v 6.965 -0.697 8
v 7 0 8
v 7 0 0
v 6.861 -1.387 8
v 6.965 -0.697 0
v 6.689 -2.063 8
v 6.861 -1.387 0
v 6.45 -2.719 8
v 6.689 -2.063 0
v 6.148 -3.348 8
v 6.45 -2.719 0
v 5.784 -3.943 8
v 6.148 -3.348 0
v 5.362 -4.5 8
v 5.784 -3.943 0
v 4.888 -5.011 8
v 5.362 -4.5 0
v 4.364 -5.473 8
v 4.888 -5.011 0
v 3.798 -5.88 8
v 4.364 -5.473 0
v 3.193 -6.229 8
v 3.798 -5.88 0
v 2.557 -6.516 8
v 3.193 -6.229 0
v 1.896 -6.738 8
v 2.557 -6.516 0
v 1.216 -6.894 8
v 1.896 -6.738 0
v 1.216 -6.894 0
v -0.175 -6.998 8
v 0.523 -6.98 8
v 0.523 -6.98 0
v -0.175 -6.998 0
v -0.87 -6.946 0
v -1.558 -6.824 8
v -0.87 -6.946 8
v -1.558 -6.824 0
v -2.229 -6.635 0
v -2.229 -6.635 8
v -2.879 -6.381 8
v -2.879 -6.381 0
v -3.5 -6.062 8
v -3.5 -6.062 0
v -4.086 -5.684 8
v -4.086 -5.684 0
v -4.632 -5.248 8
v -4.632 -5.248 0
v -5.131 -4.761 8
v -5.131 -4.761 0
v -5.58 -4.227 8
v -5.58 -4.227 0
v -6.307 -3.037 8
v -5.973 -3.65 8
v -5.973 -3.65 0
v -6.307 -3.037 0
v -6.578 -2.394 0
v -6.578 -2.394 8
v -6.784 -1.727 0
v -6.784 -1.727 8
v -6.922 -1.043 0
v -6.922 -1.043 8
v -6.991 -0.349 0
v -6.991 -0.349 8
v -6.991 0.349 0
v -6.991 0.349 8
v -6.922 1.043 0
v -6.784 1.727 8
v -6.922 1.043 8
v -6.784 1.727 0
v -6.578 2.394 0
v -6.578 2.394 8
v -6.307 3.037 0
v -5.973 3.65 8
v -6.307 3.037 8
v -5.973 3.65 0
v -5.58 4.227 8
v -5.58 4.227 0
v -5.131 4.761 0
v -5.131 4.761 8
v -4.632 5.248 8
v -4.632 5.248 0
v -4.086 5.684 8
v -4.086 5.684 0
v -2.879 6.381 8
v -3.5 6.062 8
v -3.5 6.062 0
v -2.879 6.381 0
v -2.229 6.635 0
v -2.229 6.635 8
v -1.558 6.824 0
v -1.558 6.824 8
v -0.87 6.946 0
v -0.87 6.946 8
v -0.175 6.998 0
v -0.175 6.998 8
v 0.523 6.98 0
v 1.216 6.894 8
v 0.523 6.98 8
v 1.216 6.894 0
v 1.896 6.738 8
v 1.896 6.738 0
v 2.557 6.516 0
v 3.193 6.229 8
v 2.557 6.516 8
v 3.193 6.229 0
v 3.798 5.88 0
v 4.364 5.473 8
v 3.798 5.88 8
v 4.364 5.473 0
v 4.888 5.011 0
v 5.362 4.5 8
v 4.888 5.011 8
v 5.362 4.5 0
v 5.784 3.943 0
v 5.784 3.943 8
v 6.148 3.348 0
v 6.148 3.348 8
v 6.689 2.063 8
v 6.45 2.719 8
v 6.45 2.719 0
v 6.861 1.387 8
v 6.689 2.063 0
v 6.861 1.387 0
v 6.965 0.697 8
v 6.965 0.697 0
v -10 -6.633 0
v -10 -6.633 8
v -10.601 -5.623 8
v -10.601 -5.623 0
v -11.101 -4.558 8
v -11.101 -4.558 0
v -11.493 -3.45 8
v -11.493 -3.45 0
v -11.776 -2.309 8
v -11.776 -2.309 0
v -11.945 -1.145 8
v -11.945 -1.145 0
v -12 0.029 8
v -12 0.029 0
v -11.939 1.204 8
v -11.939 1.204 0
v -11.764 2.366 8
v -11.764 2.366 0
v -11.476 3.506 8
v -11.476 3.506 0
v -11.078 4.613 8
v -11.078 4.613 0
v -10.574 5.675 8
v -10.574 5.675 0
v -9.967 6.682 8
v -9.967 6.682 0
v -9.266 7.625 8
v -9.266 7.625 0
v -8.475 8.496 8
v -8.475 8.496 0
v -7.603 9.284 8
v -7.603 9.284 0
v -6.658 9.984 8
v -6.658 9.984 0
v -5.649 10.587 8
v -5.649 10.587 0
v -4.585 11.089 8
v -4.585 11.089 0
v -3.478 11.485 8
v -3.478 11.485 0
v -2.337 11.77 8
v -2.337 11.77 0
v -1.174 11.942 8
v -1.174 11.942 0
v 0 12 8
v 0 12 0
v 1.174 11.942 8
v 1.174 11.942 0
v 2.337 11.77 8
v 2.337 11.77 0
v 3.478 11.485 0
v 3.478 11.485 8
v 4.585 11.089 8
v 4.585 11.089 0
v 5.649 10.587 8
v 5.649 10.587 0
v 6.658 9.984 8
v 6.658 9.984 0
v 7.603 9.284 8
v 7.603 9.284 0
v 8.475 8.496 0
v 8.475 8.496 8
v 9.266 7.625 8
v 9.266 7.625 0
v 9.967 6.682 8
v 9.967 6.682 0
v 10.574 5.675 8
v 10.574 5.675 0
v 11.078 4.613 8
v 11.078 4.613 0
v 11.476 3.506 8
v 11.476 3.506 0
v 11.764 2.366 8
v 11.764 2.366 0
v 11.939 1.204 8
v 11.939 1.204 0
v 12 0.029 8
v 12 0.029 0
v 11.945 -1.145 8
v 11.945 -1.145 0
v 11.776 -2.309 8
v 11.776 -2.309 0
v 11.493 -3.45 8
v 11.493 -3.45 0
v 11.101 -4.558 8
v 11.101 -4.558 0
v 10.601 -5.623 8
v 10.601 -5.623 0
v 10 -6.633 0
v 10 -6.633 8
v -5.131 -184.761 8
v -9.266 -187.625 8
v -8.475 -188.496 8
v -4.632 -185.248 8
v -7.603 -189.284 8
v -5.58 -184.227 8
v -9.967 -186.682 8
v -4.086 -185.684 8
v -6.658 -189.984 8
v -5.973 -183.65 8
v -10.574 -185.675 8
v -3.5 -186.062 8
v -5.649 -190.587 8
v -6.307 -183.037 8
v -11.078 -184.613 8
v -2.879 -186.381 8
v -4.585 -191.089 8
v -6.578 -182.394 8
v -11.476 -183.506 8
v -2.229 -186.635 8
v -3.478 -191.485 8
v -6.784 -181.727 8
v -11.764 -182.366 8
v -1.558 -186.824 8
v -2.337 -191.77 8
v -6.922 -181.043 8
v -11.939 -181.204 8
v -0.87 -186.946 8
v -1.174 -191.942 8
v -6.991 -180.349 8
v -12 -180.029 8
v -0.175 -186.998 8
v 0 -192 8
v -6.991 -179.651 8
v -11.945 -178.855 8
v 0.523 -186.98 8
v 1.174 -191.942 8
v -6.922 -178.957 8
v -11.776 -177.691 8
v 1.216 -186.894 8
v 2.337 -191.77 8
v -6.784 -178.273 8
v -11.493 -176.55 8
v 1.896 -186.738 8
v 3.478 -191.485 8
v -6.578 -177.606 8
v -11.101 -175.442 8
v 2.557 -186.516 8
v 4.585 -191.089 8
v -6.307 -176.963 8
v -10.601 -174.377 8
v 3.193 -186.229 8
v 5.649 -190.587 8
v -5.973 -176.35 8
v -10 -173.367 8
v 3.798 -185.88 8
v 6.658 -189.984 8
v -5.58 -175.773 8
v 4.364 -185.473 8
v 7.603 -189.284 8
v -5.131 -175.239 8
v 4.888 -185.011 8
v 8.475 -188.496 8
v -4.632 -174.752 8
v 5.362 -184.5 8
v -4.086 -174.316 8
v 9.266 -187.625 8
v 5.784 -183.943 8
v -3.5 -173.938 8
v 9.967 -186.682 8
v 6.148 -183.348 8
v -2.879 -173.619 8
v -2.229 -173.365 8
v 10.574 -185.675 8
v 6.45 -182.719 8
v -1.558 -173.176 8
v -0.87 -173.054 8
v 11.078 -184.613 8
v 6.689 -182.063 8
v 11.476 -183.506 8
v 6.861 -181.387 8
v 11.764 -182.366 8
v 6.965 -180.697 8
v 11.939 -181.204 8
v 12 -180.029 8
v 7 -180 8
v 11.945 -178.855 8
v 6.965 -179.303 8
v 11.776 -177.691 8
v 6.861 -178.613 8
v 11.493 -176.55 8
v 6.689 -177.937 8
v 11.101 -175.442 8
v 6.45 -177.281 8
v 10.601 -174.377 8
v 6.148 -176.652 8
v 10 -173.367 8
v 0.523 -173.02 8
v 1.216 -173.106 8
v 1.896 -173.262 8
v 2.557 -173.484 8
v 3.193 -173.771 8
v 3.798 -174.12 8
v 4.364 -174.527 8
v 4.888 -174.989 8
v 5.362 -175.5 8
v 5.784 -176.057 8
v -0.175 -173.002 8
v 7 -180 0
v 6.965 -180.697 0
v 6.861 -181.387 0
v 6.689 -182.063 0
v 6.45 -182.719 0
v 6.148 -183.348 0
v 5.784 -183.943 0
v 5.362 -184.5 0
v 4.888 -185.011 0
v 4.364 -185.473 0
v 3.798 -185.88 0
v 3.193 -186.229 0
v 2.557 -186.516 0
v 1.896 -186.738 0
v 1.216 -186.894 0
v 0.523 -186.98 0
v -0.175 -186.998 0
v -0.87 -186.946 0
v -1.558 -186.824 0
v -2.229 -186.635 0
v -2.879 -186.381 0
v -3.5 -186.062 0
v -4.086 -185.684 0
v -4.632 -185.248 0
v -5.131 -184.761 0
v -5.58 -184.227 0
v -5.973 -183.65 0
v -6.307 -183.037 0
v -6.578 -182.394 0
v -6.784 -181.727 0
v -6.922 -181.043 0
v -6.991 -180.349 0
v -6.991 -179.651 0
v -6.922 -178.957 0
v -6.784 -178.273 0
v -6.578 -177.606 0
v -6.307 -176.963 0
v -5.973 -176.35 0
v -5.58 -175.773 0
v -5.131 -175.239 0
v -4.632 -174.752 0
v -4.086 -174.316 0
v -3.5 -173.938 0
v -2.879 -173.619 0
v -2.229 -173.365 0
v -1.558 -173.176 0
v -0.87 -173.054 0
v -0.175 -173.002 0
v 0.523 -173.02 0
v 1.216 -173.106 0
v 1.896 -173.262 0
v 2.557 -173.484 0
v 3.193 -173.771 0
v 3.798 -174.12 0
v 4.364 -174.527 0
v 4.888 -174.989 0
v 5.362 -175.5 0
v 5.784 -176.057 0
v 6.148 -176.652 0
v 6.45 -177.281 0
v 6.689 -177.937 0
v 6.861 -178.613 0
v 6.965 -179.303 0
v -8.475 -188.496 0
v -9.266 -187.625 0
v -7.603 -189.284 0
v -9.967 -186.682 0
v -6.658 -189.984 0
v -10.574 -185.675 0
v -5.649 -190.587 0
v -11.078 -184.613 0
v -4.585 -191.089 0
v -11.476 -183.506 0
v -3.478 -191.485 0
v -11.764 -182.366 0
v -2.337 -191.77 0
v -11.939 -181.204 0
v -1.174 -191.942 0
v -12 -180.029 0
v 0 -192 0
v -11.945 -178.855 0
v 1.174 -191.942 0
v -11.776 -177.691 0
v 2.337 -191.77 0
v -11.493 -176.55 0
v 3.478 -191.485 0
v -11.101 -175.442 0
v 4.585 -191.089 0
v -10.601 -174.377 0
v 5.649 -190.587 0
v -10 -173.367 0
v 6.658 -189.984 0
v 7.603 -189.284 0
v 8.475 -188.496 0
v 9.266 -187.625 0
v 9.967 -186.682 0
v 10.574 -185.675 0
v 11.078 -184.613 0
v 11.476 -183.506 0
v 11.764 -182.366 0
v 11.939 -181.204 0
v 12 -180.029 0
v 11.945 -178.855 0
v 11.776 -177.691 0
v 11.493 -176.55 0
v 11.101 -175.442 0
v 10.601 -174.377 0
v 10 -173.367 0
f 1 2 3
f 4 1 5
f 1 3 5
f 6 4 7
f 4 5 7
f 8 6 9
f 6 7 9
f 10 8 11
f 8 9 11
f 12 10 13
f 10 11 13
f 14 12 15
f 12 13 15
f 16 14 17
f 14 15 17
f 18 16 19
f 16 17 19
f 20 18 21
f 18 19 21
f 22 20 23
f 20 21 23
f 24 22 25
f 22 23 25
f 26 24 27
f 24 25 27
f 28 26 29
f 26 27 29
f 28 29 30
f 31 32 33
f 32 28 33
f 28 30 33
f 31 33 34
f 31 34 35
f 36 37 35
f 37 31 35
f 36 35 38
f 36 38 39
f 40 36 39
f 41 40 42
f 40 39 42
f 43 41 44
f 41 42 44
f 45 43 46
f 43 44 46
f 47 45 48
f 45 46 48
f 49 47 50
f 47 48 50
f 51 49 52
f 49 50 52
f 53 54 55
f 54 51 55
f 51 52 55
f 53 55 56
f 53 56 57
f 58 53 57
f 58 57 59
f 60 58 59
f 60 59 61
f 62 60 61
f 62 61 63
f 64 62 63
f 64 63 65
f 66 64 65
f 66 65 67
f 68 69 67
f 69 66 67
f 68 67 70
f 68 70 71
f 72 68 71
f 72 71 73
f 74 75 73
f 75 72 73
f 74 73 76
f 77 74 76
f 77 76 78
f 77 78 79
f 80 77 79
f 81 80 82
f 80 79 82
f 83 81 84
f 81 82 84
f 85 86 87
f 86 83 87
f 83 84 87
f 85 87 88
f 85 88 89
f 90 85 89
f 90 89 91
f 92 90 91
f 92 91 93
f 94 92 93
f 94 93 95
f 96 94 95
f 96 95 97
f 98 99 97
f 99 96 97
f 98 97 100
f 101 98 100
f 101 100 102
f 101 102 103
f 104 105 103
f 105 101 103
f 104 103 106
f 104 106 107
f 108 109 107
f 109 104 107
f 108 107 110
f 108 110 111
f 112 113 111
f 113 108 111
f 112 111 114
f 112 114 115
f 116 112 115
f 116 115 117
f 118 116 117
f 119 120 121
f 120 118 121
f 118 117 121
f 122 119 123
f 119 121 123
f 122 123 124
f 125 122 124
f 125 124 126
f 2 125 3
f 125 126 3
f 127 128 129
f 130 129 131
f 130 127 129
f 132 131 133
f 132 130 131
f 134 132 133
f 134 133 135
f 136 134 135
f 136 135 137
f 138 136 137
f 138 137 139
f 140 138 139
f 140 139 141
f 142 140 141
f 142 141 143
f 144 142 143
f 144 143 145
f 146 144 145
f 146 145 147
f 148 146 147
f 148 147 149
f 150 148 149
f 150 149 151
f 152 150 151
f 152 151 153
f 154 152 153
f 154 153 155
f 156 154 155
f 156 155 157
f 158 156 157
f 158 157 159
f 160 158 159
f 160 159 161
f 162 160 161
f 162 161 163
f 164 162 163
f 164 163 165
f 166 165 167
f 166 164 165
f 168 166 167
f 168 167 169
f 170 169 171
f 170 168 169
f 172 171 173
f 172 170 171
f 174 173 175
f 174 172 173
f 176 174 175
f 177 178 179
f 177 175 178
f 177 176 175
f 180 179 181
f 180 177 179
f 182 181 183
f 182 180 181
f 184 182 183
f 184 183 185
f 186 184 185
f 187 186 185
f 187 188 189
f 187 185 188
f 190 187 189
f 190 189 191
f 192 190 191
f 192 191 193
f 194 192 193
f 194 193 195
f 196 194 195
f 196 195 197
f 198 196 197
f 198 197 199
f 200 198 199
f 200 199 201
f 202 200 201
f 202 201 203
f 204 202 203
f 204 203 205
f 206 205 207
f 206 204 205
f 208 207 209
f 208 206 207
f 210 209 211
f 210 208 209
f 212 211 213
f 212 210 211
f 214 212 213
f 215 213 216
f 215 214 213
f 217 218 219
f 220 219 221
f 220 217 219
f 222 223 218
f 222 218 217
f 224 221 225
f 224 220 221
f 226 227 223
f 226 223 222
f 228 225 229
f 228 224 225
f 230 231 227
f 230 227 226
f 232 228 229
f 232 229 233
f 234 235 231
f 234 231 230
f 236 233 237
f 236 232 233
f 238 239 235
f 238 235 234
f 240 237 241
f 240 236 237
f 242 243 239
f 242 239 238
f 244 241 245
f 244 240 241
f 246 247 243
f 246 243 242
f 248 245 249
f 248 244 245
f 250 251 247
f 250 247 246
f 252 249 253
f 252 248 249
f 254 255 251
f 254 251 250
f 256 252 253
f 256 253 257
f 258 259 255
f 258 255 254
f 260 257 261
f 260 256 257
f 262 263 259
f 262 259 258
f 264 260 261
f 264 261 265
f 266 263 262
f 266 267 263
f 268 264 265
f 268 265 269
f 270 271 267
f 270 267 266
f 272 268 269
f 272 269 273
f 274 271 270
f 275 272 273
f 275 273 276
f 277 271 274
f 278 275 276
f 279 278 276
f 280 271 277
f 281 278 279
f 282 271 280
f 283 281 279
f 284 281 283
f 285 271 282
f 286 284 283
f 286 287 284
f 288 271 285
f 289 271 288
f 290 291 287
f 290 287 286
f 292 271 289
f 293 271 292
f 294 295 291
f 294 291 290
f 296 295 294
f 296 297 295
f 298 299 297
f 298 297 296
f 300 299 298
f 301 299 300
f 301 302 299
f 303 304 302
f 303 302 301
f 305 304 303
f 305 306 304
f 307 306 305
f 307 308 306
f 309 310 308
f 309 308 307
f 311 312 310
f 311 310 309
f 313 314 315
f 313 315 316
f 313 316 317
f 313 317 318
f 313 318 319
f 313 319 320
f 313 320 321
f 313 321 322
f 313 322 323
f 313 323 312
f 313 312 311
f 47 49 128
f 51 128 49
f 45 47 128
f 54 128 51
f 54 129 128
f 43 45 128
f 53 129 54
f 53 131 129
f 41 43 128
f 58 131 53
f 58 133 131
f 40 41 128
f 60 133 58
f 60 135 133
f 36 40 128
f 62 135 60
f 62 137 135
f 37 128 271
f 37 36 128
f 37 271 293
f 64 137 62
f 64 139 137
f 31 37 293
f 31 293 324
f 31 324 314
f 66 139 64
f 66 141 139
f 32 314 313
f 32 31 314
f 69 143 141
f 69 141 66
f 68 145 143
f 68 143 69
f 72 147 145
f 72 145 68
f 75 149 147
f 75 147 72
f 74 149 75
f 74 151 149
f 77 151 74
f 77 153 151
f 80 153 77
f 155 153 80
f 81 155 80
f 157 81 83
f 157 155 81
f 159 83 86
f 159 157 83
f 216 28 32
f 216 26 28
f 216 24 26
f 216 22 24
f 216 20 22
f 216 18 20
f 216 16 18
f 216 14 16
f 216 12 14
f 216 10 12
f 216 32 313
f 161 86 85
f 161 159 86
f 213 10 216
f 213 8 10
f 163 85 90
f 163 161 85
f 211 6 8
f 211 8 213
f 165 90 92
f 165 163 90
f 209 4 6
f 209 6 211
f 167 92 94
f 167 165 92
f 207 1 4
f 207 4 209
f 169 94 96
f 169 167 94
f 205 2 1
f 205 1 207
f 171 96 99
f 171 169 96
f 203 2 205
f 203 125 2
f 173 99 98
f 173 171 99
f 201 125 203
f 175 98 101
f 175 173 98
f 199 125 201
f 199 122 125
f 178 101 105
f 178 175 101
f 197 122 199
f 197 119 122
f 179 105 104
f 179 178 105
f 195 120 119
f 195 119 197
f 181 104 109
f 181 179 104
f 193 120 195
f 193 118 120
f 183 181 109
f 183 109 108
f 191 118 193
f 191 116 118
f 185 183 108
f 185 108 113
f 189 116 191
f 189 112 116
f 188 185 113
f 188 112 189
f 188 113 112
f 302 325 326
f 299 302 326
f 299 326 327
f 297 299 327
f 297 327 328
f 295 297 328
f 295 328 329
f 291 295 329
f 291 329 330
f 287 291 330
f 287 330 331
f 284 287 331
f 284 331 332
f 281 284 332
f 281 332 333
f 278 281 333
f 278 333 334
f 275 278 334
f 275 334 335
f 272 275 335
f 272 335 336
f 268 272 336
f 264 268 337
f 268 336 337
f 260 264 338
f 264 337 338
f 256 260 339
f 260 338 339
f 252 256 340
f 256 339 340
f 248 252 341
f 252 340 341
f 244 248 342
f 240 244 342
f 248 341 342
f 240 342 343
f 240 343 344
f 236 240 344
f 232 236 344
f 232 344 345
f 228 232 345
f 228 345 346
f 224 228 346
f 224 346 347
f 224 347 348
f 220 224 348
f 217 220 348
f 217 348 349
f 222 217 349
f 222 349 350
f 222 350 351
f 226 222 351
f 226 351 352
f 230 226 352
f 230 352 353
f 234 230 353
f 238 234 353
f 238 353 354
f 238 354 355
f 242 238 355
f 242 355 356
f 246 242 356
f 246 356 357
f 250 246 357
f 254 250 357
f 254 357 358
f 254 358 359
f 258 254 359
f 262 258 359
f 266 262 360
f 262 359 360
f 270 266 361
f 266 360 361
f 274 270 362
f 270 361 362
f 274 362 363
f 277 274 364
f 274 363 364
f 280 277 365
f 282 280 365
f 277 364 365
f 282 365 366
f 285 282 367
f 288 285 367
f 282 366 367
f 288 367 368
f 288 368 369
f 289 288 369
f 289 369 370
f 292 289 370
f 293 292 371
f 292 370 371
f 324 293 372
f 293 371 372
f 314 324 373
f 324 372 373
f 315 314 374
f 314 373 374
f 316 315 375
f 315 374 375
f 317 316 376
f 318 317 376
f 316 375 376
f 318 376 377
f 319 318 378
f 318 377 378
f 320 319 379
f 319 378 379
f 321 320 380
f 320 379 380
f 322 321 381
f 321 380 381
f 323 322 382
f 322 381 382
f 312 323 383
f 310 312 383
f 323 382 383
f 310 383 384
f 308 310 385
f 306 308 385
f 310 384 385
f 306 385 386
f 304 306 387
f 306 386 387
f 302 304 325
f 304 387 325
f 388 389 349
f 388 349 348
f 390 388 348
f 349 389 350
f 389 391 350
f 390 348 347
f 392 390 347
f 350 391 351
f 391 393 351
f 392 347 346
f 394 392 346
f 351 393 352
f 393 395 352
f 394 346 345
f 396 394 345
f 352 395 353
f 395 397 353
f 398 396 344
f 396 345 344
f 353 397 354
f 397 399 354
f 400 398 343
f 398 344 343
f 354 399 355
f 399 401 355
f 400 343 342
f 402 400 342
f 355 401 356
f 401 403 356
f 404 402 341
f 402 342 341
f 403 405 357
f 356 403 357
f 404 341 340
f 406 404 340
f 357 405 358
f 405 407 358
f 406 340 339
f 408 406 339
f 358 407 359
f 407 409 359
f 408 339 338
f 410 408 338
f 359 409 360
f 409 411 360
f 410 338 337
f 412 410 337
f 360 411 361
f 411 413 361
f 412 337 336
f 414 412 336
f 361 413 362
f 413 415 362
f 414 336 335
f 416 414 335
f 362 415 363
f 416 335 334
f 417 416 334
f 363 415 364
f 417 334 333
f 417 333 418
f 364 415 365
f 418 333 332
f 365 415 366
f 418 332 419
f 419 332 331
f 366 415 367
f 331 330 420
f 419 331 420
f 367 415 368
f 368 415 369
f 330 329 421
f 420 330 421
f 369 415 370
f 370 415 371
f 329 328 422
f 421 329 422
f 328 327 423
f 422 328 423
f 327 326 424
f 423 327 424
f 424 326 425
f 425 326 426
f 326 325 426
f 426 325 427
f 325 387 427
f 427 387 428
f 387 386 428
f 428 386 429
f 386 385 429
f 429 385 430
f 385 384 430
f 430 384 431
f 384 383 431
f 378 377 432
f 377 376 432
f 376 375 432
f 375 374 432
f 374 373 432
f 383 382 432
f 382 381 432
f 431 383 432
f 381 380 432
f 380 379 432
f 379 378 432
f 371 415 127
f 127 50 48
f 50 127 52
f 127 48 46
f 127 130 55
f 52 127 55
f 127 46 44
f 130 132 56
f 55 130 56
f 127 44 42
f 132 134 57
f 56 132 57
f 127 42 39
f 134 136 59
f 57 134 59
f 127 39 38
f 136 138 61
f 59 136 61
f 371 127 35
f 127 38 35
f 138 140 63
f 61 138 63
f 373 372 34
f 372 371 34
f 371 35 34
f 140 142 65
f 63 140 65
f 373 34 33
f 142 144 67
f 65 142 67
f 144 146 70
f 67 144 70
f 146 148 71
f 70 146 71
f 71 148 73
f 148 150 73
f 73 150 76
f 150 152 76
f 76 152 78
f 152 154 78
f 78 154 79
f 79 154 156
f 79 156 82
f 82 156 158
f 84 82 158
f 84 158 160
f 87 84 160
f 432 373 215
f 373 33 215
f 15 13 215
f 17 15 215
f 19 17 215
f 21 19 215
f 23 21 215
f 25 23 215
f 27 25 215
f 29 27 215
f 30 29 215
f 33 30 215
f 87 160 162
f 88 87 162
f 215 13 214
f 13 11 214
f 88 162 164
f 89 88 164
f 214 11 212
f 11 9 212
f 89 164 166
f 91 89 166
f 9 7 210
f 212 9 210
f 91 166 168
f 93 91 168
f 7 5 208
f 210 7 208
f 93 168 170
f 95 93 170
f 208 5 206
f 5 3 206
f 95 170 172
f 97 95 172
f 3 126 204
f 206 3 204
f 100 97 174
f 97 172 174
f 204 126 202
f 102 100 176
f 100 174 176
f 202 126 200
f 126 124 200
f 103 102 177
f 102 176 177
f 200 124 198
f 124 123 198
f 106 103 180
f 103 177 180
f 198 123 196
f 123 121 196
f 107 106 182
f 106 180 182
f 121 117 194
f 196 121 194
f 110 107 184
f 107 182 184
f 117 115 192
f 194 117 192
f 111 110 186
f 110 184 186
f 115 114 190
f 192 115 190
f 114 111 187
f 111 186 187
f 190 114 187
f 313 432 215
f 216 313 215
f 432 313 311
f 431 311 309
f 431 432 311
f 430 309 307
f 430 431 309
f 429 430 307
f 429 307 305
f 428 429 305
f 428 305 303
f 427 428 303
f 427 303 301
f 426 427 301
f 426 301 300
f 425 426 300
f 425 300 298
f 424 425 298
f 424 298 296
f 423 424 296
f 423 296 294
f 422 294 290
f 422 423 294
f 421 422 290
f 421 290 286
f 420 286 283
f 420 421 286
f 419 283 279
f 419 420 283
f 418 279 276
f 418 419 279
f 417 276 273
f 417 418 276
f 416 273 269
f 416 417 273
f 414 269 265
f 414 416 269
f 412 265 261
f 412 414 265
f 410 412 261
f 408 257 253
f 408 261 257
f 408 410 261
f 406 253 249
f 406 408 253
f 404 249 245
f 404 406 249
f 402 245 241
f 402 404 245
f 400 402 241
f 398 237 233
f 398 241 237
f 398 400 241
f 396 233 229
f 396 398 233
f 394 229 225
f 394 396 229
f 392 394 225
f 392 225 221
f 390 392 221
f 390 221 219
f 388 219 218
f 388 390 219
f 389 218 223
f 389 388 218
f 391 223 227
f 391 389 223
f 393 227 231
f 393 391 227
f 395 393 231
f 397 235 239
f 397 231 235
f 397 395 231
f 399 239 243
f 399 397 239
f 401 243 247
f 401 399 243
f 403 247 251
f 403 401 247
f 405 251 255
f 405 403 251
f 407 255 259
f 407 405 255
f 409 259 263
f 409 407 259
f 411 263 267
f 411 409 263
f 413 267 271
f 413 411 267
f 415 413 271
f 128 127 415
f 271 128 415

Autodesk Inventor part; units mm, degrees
ref_plane "YZ Plane" through (0, 0, 0) normal (1, 0, 0) x (0, 1, 0)
ref_plane "XZ Plane" through (0, 0, 0) normal (0, 1, 0) x (-1, 0, 0)
ref_plane "XY Plane" through (0, 0, 0) normal (0, 0, 1) x (1, 0, 0)
sketch "スケッチ1" plane through (0, 0, 0) normal (0, 0, 1) x (1, 0, 0)
  circle A0 centre (0, 0) radius 7
  circle A1 centre (0, 0) radius 12
  line L0 (-5, 4.899) -> (5, 4.899)
  line L1 (5, 4.899) -> (5, -188.5584)
  line L2 (5, -188.5584) -> (-5, -188.5584)
  line L3 (-5, -188.5584) -> (-5, 4.899)
  circle A2 centre (0, -180) radius 7
  circle A3 centre (0, -180) radius 12
  line L4 (10, -193.5584) -> (10, 9.899)
  line L5 (10, 9.899) -> (-10, 9.899)
  line L6 (-10, 9.899) -> (-10, -193.5584)
  line L7 (-10, -193.5584) -> (10, -193.5584)
  point P0 (5, -10.9087)
  point P1 (-5, -10.9087)
  point P2 (-8, 8.9443)
  point P3 (12, 0)
  point P4 (-5, -169.0913)
  point P5 (5, -169.0913)
  point P6 (0, -188.5584)
  point P7 (10, -173.3668)
  point P8 (10, -6.6332)
  point P9 (-10, -6.6332)
  point P10 (-10, -173.3668)
  dimension "d0" = 14
  dimension "d1" = 24
  dimension "d3" = 10
  dimension "d16" = 14
  dimension "d17" = 24
  dimension "d22" = 180
  dimension "d23" = 5
  dimension "d24" = 0
  dimension "d25" = 5
extrude "押し出し1" add sketch "スケッチ1" along normal blind 8 contours A0 L3 A1 L6 L5 L4 L1 | L1 A1 L3 A0 | L1 A3 L3 A1 | A1 L4 A3 L1 | L3 A3 L6 A1 | L4 A1 | A3 L4 L6 L3 A2 L2 L1 | L1 A2 L3 A3 | A1 L6 | A3 L4 | L6 A3 | L5 A1 | L1 L2 L3 A2
equation "\"d23\" = 0.5 * d3"
properties part number "legparts_03(seven)" material "ABS プラスチック"
